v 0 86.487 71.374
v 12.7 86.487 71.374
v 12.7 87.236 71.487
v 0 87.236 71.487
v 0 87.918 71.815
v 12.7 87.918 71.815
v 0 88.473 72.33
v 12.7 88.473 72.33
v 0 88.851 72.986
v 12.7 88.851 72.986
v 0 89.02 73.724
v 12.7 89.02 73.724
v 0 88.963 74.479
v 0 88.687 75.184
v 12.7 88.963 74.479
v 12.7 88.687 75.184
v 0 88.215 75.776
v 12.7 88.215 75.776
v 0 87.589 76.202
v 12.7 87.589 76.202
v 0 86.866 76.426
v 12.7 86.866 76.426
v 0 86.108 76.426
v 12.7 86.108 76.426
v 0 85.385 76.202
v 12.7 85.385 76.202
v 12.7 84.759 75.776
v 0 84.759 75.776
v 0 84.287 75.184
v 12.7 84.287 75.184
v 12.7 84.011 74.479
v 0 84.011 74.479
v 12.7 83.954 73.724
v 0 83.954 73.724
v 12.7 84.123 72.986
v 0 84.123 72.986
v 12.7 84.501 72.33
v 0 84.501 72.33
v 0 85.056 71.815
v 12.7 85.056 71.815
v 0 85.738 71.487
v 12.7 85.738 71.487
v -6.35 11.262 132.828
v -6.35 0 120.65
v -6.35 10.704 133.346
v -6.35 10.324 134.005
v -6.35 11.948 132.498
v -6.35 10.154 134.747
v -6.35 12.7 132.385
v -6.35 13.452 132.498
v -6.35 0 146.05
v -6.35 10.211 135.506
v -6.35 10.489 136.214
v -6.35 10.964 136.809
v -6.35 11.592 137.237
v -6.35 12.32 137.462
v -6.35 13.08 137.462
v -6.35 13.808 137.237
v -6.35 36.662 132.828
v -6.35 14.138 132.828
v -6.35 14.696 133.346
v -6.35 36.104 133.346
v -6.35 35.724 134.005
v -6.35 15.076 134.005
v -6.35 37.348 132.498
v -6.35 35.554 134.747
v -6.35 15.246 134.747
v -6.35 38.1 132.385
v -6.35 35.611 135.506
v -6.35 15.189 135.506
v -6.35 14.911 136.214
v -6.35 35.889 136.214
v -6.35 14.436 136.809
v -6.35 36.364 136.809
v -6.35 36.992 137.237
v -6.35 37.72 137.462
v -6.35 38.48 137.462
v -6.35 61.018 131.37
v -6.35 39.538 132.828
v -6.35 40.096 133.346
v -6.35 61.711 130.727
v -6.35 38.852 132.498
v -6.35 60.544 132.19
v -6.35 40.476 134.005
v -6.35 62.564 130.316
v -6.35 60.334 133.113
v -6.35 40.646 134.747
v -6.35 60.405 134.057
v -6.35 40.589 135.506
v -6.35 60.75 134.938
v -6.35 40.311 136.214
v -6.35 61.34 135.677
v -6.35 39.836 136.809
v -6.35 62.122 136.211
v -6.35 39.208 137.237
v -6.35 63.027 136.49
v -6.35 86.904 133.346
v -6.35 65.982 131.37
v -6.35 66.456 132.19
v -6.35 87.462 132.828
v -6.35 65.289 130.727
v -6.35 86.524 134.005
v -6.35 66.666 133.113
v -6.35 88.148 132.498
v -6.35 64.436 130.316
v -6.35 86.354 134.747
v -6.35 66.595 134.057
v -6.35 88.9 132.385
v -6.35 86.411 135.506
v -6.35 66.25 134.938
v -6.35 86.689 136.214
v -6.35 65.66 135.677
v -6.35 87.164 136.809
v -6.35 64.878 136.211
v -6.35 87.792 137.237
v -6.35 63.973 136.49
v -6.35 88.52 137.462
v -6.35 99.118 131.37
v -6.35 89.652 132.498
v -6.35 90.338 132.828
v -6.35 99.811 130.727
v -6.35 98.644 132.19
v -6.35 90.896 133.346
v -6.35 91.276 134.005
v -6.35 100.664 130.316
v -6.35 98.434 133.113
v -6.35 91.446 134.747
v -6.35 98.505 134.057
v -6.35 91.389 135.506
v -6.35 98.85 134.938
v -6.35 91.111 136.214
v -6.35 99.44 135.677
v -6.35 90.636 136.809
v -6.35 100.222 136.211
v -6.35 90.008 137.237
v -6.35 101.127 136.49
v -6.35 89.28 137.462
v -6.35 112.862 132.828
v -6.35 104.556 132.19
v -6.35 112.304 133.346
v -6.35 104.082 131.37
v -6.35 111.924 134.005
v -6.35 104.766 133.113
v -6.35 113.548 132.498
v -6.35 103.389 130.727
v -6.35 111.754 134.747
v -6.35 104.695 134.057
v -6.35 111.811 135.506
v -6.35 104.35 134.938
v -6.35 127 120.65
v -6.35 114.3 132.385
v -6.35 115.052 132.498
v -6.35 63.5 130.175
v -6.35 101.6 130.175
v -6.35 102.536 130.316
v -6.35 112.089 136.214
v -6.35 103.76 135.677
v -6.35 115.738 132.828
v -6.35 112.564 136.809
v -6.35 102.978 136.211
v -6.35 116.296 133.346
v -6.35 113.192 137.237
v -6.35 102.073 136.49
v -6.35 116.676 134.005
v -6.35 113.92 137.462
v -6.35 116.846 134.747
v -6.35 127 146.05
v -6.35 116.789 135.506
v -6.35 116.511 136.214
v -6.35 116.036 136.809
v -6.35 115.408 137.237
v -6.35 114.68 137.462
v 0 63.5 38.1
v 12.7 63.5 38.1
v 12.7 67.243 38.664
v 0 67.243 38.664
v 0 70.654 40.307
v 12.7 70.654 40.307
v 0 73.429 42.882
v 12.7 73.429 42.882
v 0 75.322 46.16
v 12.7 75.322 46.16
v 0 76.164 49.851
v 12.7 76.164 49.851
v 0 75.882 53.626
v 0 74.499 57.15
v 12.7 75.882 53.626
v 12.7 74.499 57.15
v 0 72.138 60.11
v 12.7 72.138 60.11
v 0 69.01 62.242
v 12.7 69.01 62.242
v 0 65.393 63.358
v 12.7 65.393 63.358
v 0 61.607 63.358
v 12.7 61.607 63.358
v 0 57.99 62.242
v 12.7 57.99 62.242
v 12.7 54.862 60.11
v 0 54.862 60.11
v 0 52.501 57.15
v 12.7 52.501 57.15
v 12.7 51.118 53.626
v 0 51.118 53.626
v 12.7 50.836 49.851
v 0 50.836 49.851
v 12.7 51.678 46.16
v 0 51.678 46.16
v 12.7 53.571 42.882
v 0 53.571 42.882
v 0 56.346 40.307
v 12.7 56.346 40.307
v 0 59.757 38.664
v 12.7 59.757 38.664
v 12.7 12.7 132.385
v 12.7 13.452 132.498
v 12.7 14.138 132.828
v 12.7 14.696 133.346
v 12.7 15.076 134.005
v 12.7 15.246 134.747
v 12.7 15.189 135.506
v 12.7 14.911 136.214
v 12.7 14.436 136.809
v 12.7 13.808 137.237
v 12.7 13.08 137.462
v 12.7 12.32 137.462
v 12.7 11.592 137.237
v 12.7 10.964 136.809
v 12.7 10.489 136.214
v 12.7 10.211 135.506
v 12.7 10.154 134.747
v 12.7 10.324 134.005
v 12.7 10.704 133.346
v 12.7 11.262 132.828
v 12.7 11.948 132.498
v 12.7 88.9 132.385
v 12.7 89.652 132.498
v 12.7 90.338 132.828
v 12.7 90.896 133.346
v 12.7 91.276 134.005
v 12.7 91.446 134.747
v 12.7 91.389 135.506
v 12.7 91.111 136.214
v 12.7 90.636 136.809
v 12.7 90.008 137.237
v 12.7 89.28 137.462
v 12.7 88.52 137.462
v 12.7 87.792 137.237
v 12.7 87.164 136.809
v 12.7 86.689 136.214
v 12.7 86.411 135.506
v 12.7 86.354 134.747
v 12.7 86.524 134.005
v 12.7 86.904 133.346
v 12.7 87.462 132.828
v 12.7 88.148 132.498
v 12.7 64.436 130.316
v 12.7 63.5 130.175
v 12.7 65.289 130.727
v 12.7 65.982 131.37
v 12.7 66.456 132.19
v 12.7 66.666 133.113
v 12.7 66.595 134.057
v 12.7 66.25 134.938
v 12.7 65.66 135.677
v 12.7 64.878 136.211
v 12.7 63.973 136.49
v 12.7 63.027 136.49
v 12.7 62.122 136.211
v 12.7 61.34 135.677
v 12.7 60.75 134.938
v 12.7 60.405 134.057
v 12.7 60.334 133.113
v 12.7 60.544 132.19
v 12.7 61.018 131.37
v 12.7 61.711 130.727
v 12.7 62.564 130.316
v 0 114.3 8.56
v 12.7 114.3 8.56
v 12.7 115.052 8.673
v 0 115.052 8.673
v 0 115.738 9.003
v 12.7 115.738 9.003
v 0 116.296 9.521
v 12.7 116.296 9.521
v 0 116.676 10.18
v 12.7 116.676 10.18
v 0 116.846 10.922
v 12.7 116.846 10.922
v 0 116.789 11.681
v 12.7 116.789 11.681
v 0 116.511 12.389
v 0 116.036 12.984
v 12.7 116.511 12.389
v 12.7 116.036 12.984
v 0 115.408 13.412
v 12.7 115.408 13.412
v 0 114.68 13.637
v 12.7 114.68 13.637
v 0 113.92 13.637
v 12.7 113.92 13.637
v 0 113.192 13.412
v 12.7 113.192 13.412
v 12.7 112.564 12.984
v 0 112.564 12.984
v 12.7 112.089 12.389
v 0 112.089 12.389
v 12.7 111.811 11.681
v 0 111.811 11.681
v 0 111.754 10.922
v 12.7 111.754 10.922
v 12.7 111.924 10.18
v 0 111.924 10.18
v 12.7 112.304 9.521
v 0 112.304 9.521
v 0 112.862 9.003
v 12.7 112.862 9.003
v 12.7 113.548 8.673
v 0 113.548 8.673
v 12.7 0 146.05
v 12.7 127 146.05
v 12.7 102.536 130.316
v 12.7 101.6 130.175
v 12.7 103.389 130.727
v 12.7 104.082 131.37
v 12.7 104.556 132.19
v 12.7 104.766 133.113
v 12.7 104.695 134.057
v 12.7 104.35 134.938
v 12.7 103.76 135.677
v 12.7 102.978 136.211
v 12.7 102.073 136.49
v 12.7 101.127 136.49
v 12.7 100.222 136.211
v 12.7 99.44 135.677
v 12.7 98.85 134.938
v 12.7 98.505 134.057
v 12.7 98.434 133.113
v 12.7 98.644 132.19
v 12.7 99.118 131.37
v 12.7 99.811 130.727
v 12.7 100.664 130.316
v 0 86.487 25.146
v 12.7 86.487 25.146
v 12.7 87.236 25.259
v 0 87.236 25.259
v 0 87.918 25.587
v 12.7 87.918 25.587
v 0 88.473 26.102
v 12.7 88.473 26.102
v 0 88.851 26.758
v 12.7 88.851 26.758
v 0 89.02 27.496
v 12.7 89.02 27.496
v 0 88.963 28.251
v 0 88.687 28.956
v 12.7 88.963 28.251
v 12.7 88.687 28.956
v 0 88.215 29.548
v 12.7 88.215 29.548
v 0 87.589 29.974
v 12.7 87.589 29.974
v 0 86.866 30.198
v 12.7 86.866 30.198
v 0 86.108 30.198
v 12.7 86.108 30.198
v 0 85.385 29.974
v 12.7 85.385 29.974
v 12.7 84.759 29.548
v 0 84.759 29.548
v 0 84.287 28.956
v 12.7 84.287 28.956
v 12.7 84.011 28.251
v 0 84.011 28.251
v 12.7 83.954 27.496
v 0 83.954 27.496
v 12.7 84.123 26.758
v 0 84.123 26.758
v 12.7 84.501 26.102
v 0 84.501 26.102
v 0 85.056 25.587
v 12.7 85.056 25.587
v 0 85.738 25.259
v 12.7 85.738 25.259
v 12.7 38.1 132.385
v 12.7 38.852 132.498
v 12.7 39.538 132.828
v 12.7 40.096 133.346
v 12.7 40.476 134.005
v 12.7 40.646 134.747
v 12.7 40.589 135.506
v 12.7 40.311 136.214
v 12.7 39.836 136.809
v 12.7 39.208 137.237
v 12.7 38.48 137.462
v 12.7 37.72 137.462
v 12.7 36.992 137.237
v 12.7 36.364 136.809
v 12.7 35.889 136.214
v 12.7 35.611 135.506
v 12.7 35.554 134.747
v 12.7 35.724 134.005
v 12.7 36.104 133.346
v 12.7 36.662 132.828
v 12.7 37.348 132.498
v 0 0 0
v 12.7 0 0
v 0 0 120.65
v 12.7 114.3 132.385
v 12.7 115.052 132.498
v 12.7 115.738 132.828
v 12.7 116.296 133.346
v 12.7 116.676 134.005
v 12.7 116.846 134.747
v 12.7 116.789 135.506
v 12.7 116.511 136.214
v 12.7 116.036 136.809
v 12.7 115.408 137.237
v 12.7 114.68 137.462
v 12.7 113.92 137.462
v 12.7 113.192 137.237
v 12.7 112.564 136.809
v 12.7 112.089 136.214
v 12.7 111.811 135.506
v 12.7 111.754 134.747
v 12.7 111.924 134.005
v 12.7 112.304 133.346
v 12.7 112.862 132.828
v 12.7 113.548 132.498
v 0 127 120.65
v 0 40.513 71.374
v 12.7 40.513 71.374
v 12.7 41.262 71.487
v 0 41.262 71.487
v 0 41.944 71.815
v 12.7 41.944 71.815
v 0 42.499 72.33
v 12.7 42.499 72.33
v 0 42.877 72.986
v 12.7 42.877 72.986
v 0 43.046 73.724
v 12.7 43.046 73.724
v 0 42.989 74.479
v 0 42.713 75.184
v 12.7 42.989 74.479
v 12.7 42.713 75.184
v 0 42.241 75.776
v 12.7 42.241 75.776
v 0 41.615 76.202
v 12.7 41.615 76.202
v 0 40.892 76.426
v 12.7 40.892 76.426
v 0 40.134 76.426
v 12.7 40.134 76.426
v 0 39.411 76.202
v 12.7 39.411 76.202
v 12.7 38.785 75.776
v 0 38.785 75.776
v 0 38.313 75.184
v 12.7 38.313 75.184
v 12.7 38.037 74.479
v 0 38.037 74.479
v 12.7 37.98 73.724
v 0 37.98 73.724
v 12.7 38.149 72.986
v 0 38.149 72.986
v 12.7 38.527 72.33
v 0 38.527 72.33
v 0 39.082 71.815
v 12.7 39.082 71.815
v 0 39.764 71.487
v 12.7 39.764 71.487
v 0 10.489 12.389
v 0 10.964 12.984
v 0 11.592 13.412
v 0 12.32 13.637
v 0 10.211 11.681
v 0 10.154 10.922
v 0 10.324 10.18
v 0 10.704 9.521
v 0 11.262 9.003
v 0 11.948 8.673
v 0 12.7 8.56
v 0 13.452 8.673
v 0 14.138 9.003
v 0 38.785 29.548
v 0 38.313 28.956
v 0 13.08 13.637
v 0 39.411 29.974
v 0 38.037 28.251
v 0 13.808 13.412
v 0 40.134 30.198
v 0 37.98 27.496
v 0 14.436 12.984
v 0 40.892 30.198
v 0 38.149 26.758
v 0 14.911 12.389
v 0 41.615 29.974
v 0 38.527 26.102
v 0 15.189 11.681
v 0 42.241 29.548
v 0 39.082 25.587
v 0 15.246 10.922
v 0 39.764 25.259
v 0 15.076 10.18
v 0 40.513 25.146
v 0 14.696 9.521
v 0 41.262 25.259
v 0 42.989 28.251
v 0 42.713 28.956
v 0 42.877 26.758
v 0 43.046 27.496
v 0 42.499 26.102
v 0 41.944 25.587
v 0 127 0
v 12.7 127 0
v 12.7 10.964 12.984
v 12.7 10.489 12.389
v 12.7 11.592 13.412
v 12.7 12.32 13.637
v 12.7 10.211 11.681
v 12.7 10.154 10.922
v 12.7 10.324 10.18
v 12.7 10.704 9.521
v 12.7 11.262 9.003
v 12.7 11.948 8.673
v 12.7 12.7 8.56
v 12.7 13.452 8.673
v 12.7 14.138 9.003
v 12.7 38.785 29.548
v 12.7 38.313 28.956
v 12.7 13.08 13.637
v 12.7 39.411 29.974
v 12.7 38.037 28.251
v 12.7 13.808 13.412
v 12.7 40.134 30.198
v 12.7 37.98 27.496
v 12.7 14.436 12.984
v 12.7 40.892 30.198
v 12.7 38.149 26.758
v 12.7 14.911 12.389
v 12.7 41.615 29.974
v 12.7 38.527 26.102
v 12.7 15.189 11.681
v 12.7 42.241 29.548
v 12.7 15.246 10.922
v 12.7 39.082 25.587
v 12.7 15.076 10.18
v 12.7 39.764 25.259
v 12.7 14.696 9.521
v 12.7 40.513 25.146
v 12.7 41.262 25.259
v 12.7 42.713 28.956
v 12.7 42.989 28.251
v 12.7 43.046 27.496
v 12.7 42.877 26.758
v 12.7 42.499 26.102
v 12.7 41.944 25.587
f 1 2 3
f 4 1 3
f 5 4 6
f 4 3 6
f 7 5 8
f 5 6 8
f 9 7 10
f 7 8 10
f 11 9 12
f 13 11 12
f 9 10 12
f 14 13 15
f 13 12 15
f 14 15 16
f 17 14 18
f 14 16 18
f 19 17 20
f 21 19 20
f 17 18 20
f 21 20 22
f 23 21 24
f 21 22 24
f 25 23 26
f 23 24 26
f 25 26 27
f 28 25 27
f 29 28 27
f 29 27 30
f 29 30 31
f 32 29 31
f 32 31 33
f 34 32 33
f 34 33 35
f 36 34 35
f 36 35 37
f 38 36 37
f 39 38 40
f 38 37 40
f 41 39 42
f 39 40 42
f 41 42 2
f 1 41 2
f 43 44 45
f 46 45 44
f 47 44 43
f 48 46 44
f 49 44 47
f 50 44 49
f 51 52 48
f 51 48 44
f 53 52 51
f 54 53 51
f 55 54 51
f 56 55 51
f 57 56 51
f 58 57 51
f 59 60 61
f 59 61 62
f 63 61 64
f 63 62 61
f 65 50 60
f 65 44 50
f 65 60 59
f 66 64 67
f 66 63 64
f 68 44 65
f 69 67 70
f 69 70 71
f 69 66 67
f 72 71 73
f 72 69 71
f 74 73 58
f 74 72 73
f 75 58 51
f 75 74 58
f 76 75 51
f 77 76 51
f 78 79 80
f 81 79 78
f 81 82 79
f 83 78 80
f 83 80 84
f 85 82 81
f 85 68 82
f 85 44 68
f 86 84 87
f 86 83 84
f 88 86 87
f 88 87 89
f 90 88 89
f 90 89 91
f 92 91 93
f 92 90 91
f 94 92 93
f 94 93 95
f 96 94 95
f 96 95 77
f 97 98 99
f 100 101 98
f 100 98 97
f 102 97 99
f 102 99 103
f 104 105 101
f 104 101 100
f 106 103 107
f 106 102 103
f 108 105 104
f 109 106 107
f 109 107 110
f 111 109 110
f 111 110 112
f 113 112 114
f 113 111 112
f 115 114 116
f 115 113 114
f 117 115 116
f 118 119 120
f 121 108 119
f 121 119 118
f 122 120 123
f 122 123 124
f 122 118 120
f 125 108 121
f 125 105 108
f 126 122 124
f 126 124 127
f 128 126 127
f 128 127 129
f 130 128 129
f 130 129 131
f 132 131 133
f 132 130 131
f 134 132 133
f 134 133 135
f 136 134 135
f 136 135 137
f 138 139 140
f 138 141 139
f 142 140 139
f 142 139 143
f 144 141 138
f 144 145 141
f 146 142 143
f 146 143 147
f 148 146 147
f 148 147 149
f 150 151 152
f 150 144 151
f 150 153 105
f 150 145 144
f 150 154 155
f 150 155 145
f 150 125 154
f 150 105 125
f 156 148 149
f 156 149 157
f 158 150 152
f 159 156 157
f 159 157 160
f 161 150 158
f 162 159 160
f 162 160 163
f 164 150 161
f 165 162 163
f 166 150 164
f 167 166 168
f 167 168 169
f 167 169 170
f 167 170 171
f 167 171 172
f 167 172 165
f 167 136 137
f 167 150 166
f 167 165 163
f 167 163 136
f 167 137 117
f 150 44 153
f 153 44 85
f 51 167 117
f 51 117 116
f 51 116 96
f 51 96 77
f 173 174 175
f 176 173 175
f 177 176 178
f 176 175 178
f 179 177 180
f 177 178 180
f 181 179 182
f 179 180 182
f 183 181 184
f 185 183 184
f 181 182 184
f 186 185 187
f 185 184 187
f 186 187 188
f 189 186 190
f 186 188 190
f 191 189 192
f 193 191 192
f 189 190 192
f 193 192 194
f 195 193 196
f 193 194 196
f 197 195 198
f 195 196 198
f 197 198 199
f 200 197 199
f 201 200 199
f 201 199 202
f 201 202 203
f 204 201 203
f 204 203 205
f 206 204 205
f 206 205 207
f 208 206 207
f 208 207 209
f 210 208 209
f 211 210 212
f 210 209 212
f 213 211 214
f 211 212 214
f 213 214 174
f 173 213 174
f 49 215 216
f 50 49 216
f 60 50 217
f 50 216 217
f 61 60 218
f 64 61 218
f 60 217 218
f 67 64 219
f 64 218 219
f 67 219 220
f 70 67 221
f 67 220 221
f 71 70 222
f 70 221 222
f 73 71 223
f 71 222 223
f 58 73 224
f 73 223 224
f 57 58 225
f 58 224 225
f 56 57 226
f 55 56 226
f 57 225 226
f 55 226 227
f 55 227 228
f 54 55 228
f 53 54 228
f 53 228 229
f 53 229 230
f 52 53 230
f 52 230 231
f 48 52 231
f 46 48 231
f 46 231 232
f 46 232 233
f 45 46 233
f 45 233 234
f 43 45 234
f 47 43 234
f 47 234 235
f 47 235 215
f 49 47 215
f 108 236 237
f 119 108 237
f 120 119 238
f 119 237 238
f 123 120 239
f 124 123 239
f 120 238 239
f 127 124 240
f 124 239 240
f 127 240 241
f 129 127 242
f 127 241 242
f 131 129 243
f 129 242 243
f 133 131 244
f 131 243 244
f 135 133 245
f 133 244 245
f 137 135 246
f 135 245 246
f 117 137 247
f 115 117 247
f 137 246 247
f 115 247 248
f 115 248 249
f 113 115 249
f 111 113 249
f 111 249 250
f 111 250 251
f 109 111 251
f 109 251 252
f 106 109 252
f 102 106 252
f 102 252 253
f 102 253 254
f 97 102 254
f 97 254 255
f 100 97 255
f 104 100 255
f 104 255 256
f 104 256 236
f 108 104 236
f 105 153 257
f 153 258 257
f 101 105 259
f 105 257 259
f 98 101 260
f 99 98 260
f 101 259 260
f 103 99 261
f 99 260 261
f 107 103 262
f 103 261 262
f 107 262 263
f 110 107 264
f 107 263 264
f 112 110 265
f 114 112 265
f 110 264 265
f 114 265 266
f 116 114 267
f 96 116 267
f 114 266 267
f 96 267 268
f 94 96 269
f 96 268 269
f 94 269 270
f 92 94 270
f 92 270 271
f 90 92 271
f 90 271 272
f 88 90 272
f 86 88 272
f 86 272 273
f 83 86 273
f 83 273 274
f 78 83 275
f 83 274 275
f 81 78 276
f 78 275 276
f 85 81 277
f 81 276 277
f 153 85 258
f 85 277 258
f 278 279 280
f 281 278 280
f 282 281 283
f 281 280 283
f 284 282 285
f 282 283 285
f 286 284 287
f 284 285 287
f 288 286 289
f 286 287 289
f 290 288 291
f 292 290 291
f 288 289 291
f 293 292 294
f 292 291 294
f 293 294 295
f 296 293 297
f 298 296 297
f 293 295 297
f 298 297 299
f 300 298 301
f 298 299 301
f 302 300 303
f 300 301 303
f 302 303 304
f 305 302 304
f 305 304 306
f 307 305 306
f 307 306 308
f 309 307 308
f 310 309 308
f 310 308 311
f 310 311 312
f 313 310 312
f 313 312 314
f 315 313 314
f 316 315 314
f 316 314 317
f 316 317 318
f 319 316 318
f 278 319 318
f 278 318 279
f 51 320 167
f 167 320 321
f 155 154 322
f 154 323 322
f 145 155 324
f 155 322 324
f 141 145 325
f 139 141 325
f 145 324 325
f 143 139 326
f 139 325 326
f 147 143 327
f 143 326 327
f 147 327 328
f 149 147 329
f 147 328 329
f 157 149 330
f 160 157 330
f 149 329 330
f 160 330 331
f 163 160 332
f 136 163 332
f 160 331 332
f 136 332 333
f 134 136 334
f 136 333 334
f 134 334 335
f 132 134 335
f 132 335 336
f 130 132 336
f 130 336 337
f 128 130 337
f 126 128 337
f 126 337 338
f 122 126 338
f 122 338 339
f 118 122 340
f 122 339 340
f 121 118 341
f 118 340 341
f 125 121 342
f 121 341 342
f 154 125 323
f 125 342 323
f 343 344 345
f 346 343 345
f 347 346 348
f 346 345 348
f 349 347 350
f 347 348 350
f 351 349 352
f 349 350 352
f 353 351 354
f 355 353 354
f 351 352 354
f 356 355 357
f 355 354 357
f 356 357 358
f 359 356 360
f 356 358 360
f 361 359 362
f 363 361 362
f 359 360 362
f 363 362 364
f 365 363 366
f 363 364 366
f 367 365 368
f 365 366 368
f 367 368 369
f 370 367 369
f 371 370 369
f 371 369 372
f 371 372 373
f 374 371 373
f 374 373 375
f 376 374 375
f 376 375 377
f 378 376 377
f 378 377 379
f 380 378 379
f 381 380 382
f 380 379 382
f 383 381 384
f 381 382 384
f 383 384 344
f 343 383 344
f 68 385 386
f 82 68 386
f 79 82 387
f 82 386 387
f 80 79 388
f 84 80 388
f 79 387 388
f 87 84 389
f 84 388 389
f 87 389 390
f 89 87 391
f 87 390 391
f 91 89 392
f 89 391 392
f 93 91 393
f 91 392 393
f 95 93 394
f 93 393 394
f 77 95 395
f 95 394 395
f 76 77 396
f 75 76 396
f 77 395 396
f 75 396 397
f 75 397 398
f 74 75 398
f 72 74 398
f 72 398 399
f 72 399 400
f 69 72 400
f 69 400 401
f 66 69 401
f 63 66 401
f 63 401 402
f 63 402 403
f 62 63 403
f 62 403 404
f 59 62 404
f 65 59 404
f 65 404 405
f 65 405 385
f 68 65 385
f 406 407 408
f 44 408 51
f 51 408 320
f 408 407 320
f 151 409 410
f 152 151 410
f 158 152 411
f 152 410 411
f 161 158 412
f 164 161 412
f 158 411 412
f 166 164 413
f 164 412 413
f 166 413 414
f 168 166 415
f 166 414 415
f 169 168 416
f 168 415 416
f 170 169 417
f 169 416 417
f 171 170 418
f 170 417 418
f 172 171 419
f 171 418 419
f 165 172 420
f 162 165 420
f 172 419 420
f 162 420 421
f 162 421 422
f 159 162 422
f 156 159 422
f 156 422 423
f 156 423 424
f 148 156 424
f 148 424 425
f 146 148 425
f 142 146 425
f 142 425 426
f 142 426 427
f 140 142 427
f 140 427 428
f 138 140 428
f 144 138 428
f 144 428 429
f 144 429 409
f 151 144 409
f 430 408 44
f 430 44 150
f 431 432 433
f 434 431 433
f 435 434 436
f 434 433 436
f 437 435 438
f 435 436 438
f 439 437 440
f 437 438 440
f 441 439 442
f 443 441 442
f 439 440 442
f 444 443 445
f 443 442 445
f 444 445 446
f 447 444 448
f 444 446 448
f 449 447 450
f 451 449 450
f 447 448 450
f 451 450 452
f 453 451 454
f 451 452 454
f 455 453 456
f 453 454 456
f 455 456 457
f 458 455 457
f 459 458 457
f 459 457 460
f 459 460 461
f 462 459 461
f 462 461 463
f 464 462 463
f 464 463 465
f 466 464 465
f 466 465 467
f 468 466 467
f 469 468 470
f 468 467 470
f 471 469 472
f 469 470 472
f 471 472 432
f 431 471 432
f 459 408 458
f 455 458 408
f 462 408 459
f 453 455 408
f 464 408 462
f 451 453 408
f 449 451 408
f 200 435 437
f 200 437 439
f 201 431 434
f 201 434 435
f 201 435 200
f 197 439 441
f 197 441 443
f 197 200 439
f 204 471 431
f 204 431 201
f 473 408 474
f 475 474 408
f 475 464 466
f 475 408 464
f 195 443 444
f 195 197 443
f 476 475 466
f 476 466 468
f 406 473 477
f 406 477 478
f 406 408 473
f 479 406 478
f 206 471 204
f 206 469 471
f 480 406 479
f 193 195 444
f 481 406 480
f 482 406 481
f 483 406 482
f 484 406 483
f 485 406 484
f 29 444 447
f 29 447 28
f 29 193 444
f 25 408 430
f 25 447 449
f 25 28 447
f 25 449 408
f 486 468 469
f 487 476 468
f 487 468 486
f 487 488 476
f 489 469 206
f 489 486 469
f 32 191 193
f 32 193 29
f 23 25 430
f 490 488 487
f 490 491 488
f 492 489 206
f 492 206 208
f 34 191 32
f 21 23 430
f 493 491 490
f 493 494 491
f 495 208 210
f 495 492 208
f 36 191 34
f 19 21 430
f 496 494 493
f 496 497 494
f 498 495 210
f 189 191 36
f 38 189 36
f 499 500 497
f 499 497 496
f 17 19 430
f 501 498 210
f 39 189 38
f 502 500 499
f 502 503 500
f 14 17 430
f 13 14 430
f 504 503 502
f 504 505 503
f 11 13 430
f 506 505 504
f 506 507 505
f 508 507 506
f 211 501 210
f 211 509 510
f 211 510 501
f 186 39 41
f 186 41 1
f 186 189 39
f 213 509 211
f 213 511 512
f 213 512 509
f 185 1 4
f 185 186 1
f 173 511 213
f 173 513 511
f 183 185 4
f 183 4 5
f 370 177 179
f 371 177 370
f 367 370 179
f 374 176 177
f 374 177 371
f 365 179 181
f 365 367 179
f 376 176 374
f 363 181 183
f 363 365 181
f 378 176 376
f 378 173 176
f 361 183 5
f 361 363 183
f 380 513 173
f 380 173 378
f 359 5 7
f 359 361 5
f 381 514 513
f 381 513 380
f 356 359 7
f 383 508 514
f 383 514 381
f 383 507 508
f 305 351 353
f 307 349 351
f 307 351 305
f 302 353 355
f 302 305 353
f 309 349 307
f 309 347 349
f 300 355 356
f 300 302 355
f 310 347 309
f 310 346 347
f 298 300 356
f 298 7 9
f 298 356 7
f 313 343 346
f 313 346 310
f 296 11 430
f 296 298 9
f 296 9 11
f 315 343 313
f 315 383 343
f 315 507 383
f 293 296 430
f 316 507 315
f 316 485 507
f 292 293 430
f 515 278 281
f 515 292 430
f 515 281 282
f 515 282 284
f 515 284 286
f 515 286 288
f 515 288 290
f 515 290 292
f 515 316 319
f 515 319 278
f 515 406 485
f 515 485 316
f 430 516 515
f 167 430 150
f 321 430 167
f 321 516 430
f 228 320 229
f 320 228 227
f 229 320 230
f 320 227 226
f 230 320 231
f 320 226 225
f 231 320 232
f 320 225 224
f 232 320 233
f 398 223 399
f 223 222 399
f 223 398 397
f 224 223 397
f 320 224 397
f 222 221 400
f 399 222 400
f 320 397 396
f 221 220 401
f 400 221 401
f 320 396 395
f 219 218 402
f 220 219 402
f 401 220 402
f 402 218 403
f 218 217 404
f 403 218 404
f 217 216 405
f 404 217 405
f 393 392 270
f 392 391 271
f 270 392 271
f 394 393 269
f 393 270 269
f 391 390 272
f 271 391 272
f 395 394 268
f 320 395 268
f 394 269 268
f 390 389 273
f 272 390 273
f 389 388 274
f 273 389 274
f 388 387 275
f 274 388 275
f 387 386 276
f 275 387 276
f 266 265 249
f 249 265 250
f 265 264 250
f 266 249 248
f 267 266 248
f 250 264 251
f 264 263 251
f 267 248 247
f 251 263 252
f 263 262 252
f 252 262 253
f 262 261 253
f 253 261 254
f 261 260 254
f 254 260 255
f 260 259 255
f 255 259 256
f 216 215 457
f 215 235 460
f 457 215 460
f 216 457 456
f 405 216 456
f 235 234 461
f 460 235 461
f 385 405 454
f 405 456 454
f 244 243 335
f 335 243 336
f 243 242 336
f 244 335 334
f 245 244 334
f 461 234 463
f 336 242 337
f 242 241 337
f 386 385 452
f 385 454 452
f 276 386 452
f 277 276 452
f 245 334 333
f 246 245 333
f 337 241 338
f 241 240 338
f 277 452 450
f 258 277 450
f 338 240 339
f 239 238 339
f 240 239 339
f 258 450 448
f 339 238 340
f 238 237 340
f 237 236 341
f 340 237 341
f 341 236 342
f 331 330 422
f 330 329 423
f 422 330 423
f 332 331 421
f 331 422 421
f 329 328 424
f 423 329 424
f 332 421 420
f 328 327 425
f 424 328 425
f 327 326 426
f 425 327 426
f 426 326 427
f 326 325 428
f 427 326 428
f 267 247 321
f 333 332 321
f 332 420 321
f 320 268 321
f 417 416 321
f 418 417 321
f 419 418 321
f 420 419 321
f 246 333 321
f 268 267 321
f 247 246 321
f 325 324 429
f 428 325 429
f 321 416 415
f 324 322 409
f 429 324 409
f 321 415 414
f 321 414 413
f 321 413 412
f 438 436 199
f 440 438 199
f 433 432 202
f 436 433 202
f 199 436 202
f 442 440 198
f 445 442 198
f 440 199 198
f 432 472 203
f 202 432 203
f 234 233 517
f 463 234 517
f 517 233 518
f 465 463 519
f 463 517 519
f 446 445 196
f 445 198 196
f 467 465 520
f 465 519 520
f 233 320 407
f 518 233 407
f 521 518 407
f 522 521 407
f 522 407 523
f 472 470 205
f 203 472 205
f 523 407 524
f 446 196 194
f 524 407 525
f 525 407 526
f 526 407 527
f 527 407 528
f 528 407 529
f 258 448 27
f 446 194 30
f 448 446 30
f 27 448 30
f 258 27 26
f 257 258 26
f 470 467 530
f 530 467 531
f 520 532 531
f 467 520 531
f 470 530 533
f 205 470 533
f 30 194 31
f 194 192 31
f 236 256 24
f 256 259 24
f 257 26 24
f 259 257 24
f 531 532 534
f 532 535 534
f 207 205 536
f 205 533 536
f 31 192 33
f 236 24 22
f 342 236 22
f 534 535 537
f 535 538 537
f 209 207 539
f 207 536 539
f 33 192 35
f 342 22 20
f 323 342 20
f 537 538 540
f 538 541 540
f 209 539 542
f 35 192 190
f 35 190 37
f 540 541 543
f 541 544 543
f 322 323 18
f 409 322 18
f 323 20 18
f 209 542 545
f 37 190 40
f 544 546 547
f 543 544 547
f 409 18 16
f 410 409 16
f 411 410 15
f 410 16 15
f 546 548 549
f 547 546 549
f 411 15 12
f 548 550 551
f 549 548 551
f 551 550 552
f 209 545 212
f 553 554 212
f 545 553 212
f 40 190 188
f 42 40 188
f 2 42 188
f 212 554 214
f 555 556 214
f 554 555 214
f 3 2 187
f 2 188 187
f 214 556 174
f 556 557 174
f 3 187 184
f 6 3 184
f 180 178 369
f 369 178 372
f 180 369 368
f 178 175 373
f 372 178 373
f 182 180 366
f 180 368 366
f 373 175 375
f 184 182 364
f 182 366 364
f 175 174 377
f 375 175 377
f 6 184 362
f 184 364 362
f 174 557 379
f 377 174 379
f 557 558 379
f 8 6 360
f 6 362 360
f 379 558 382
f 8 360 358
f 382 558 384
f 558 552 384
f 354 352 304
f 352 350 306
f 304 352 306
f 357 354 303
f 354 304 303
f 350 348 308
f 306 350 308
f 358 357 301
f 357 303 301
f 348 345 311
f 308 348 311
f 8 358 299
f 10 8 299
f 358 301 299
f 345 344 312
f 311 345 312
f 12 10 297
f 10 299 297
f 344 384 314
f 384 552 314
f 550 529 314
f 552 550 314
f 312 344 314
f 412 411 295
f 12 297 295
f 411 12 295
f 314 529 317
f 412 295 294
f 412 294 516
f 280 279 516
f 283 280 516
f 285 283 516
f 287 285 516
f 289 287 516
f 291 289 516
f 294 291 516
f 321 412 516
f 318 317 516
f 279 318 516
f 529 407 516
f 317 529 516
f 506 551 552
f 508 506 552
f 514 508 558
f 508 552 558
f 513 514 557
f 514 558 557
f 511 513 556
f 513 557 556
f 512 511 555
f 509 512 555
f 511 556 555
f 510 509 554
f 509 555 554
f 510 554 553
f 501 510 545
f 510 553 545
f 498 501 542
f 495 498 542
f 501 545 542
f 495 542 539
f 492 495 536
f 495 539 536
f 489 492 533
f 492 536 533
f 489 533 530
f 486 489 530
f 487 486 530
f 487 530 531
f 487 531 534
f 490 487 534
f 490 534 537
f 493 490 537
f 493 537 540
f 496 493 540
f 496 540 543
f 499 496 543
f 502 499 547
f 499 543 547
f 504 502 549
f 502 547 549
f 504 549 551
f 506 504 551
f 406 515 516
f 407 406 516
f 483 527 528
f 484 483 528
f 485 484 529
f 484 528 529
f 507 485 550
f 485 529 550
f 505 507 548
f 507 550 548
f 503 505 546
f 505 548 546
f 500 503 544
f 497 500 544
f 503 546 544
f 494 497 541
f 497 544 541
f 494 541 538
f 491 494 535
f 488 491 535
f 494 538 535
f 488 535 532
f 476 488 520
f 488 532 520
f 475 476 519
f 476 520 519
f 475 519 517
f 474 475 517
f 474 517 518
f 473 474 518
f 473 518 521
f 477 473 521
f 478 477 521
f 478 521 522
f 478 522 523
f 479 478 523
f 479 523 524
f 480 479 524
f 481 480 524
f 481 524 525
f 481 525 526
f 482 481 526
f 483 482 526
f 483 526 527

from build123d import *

# Parameters (mm, degrees)
SKETCH1_W               = 12.7
SKETCH1_H               = 127
BOSS_EXTRUDE1_DEPTH     = 146.05
SKETCH3_R               = 3.175
SKETCH3_R_2             = 12.7
SKETCH3_R_3             = 2.54
CUT_EXTRUDE1_DEPTH      = 12.7
SKETCH4_W               = 25.4
SKETCH4_H               = 127
BOSS_EXTRUDE2_DEPTH     = 6.35
SKETCH9_R               = 3.175
CUT_EXTRUDE2_DEPTH      = 194.961059236
F_1_4_20_TAPPED_HOLE1_D = 5.1054
F_1_4_20_TAPPED_HOLE2_D = 5.1054


with BuildPart() as part:
    # Sketch1 → Boss-Extrude1 (new body)
    with BuildSketch(Plane.XY):
        with Locations((6.35, 63.5)):
            Rectangle(SKETCH1_W, SKETCH1_H)
    extrude(amount=BOSS_EXTRUDE1_DEPTH)

    # Sketch3 → Cut-Extrude1 (cut)
    with BuildSketch(Plane(origin=(12.7, 0, 0), x_dir=(0, 0, -1), z_dir=(1, 0, 0))):
        with Locations((-133.35, 63.5)):
            Circle(SKETCH3_R)
        with Locations((-133.35, 101.6)):
            Circle(SKETCH3_R)
        with Locations((-50.8, 63.5)):
            Circle(SKETCH3_R_2)
        with Locations((-73.914, 86.487)):
            Circle(SKETCH3_R_3)
        with Locations((-27.686, 86.487)):
            Circle(SKETCH3_R_3)
        with Locations((-27.686, 40.513)):
            Circle(SKETCH3_R_3)
        with Locations((-73.914, 40.513)):
            Circle(SKETCH3_R_3)
    extrude(amount=-CUT_EXTRUDE1_DEPTH, mode=Mode.SUBTRACT)

    # Sketch4 → Boss-Extrude2 (add)
    with BuildSketch(Plane.ZY):
        with Locations((133.35, 63.5)):
            Rectangle(SKETCH4_W, SKETCH4_H)
    extrude(amount=BOSS_EXTRUDE2_DEPTH)

    # Sketch9 → Cut-Extrude2 (cut, through all)
    with BuildSketch(Plane(origin=(0, 0, 0), x_dir=(0, 0, -1), z_dir=(1, 0, 0))):
        with Locations((-133.35, 101.6)):
            Circle(SKETCH9_R)
        with Locations((-133.35, 63.5)):
            Circle(SKETCH9_R)
    extrude(amount=-CUT_EXTRUDE2_DEPTH, mode=Mode.SUBTRACT)

    # 1/4-20 Tapped Hole1 (through all)
    with Locations(Plane.ZY):
        with Locations((11.1125, 114.3), (11.1125, 12.7)):
            Hole(F_1_4_20_TAPPED_HOLE1_D / 2)

    # 1/4-20 Tapped Hole2 (through all)
    with Locations(Plane.ZY.offset(6.35)):
        with Locations((134.9375, 114.3), (134.9375, 88.9), (134.9375, 38.1), (134.9375, 12.7)):
            Hole(F_1_4_20_TAPPED_HOLE2_D / 2)


solid = part.part
